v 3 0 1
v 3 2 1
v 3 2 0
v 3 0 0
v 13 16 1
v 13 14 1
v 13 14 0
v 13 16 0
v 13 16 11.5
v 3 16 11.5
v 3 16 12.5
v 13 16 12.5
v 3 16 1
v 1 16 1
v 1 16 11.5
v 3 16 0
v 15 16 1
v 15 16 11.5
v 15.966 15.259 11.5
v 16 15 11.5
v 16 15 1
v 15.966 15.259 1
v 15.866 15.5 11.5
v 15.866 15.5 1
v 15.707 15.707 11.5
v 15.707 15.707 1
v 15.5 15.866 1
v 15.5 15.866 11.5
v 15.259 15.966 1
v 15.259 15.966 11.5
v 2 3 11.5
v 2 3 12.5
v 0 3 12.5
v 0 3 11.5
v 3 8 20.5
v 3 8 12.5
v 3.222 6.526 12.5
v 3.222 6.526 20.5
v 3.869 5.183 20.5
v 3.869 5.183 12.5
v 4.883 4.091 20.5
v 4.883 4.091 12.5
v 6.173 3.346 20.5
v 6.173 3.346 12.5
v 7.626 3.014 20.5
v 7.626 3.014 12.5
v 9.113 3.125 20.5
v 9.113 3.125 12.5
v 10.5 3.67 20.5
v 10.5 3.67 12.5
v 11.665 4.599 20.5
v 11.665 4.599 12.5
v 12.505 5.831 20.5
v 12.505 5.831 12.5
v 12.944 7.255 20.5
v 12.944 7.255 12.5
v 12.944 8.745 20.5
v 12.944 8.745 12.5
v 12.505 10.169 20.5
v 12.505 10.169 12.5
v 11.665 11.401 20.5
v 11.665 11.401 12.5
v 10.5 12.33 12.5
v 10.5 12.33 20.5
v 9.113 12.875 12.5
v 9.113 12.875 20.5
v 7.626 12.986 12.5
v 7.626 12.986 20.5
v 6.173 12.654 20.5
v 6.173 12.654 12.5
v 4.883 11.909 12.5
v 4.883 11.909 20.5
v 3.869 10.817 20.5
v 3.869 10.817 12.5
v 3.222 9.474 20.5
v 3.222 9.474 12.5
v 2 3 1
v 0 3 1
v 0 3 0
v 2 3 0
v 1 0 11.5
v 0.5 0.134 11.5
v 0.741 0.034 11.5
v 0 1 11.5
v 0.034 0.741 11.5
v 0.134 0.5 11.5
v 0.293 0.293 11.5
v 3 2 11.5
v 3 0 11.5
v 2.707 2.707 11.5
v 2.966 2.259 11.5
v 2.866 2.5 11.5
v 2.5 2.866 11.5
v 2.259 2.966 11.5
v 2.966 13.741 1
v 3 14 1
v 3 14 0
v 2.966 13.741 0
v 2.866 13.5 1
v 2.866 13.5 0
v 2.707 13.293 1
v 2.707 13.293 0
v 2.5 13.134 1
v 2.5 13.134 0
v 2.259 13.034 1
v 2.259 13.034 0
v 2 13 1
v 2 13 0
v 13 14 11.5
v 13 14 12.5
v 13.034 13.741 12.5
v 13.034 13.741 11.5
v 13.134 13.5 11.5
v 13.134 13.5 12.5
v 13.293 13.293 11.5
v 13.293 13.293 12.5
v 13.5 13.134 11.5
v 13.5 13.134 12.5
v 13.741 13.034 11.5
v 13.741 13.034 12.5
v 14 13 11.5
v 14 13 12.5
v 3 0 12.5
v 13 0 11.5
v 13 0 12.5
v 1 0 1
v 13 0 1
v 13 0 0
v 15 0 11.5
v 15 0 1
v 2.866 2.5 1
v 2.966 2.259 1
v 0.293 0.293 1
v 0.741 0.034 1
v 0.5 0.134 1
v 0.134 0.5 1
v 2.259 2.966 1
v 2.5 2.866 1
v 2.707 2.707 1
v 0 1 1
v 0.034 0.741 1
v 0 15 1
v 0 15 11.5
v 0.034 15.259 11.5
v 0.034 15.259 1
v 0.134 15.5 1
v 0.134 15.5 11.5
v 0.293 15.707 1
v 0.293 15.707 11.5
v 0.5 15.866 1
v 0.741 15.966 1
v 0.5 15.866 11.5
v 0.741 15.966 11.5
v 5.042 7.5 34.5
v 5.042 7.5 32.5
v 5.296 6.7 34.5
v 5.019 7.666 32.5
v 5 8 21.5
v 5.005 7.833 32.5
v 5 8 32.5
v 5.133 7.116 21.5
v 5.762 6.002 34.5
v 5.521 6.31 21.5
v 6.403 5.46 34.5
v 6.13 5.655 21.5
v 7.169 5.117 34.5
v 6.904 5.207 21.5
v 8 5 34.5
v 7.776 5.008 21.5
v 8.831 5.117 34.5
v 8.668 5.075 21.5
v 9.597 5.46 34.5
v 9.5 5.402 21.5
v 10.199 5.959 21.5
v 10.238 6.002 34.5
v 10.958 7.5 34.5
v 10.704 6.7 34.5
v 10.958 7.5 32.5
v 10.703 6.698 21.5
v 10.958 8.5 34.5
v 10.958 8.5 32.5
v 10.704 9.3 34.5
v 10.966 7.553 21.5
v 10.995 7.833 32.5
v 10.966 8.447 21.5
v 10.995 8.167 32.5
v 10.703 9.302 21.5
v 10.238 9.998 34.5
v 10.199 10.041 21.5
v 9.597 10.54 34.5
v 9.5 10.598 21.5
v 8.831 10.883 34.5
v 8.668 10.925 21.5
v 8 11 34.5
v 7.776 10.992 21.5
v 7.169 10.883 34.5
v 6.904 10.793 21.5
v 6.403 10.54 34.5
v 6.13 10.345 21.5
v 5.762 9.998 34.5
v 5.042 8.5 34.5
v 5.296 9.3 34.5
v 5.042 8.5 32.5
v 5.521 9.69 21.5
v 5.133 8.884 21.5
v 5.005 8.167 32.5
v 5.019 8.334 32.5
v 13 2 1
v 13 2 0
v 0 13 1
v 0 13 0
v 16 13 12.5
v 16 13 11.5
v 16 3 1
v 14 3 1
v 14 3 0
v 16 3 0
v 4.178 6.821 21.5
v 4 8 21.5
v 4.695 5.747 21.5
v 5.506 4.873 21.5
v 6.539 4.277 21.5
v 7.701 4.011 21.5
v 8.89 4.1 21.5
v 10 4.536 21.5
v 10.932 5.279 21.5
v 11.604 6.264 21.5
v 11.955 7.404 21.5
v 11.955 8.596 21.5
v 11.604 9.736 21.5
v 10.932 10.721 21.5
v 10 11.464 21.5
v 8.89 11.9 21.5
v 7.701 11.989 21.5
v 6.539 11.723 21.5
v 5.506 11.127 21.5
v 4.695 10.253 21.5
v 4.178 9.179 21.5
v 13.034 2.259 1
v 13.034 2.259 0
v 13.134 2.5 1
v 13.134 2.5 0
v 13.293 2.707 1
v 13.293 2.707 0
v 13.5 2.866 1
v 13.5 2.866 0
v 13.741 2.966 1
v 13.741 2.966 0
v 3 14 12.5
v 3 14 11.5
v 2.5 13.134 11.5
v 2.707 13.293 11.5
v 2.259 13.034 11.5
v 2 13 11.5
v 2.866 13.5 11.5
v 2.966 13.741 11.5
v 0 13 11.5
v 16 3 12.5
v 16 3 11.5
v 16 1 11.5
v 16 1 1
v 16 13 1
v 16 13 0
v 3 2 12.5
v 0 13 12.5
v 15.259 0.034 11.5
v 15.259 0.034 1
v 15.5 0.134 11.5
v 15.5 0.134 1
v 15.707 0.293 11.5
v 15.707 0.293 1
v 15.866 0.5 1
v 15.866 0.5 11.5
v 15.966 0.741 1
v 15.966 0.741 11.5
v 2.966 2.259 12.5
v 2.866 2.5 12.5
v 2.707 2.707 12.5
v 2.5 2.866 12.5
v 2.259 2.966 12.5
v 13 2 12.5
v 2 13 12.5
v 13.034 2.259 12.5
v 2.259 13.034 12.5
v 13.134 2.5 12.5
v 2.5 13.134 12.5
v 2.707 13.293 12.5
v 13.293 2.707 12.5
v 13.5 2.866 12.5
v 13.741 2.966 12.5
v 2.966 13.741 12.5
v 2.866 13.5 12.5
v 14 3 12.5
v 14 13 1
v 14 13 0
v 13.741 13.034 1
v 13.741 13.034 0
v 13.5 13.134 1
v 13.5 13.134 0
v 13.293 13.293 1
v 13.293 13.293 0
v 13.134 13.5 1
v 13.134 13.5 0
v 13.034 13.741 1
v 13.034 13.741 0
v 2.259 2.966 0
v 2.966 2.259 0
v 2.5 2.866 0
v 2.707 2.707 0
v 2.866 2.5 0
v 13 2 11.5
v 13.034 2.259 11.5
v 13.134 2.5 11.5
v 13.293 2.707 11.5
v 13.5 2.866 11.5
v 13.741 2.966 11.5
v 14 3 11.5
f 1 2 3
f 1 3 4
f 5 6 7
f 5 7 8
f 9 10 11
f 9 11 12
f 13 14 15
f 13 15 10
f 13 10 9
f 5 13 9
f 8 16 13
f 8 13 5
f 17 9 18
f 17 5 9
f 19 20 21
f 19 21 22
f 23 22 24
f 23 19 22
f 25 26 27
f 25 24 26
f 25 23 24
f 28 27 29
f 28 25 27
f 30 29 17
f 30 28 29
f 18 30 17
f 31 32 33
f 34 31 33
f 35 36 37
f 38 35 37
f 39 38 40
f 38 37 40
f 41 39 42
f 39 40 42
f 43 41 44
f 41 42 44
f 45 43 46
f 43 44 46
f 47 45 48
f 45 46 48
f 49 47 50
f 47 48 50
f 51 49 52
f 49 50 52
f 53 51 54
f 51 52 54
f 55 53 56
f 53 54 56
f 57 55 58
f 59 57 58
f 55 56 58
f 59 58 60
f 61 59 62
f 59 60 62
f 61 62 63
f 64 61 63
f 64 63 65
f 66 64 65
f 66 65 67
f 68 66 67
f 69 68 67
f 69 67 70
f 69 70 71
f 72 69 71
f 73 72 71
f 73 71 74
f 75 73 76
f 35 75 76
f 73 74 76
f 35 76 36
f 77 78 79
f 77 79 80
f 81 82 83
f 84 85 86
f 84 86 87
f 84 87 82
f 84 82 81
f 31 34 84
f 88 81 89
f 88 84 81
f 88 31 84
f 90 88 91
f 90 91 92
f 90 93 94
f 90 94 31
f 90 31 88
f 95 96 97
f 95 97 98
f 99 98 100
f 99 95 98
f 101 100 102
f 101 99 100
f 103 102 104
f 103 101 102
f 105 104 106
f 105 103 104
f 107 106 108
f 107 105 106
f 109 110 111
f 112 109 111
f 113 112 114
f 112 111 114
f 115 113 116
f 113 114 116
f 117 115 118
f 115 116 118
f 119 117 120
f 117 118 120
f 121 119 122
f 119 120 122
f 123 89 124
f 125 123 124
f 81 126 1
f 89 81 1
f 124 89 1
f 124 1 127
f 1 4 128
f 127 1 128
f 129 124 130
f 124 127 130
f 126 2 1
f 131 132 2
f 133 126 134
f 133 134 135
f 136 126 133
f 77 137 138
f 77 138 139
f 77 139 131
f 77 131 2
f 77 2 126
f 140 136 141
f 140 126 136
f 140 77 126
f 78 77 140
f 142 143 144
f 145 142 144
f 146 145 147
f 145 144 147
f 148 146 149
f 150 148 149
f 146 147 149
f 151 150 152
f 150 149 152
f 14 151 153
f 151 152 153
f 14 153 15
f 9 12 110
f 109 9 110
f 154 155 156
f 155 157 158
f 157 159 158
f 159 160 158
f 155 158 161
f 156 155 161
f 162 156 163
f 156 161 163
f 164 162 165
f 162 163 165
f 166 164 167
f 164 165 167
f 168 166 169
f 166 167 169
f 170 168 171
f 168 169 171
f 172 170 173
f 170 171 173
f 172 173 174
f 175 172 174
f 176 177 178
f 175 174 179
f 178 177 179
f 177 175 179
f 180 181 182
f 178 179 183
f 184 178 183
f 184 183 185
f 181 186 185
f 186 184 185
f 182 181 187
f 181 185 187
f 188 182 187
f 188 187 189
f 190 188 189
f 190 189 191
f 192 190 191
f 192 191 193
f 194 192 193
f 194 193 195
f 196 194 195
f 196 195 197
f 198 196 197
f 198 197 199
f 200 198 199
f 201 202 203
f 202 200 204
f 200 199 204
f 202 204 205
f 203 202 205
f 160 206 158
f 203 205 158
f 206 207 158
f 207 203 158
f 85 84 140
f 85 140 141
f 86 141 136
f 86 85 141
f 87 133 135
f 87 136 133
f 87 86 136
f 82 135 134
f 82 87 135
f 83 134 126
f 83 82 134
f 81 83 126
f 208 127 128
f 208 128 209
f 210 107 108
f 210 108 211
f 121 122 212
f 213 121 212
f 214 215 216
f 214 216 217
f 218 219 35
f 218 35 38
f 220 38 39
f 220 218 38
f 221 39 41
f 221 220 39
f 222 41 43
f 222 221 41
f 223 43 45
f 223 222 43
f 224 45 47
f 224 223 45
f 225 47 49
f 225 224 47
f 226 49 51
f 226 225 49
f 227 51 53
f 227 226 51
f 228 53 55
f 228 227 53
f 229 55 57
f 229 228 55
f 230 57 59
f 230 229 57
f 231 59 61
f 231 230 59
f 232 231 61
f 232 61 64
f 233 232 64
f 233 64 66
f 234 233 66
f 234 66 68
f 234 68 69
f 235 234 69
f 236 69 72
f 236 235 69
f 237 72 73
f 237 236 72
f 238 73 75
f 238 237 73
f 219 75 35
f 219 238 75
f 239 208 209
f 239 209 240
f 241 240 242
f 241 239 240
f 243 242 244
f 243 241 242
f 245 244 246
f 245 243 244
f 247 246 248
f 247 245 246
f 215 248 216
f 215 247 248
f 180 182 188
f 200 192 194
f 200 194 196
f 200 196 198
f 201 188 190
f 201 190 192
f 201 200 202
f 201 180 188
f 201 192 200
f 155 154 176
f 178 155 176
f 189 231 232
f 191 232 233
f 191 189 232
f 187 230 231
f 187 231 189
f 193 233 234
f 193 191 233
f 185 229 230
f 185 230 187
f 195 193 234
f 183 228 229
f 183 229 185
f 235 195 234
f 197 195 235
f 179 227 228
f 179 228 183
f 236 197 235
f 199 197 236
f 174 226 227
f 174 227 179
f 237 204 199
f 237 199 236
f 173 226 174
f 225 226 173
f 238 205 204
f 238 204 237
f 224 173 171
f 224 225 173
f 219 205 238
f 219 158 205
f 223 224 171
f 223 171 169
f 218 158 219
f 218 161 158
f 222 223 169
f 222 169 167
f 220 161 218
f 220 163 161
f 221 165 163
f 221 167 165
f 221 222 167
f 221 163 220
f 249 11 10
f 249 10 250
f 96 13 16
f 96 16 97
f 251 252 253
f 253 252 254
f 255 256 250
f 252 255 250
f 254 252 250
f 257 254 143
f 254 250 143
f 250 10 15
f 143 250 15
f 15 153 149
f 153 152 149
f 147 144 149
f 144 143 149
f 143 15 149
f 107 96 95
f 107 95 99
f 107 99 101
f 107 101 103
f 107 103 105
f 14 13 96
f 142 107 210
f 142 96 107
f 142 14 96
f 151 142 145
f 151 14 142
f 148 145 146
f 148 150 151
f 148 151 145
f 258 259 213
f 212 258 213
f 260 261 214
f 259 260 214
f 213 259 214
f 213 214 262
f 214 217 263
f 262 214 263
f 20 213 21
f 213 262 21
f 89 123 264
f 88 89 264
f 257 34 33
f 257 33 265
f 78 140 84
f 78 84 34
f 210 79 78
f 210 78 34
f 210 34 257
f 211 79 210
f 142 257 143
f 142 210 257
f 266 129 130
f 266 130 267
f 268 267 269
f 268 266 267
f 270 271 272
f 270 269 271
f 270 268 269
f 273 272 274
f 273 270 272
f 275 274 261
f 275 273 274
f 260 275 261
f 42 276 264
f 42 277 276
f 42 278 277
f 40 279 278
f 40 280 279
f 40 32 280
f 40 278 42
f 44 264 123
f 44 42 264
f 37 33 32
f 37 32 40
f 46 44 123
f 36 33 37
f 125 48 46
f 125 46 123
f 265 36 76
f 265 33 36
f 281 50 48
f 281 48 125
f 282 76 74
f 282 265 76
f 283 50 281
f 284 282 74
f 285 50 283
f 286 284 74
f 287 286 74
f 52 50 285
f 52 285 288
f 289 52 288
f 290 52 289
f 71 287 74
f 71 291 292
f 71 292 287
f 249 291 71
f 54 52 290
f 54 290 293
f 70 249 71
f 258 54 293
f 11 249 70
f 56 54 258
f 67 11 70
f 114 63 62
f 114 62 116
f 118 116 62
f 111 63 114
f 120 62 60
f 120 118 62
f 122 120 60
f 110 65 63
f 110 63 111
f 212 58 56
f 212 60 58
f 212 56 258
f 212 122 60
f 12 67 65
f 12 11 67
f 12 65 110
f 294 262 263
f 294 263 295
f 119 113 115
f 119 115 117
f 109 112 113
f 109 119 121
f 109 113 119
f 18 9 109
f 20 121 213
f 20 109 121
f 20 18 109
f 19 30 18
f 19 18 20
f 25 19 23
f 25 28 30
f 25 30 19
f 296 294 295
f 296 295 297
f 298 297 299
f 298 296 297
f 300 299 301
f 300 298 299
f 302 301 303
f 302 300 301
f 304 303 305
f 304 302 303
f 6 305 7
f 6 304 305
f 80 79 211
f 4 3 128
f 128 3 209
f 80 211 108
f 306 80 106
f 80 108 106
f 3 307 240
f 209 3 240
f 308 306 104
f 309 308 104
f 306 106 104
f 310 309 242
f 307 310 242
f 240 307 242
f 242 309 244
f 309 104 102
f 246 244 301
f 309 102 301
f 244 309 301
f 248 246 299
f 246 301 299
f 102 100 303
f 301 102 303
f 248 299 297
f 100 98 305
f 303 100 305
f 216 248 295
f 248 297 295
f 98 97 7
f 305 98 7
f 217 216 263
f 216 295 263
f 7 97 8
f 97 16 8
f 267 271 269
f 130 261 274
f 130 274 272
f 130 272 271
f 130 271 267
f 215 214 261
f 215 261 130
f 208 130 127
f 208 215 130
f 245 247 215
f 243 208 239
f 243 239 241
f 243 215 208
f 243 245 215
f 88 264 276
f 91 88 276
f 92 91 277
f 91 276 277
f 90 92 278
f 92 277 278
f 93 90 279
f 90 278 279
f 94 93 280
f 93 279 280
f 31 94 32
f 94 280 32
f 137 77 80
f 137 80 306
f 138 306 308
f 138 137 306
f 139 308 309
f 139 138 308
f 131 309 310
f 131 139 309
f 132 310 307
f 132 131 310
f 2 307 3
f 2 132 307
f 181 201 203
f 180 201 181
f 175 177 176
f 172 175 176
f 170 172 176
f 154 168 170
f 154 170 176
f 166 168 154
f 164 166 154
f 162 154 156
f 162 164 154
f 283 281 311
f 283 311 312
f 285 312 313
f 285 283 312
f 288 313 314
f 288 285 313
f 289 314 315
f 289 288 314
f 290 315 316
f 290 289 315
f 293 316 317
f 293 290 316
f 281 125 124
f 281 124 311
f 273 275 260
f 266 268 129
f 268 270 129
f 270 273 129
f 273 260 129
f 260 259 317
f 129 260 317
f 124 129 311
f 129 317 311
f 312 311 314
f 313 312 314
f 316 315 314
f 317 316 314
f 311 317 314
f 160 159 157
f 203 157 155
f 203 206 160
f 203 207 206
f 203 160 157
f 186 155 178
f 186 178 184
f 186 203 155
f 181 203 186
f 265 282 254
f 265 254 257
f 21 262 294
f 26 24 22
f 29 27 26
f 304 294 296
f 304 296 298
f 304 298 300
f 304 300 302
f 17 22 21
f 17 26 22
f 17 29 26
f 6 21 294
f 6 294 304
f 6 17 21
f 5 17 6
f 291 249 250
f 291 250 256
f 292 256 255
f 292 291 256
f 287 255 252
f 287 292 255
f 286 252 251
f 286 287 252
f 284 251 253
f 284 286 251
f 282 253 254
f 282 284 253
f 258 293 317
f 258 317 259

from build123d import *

# Parameters (mm, degrees)
ESQUISSE1_W             = 16
ESQUISSE1_H             = 16
EXTRUSION1_DEPTH        = 12.5
CONG_1_R                = 1
ESQUISSE2_R             = 5
EXTRUSION2_DEPTH        = 9
CHANFREIN1_SIZE         = 1
ESQUISSE3_R             = 3
EXTRUSION3_DEPTH        = 13
ESQUISSE4_W             = 6.995230525
ESQUISSE4_H             = 1
ENL_V_MAT_EXTRU_1_DEPTH = 2
ENL_V_MAT_EXTRU_2_DEPTH = 1
ENL_V_START             = -1
ENL_V_MAT_EXTRU_3_DEPTH = 1


with BuildPart() as part:
    # Esquisse1 → Extrusion1 (new body)
    with BuildSketch(Plane.XY):
        with Locations((8, 8)):
            Rectangle(ESQUISSE1_W, ESQUISSE1_H)
    extrude(amount=EXTRUSION1_DEPTH)

    # Congé1
    cong_1_edges = [part.edges().sort_by_distance(p)[0] for p in [
        (0, 16, 6.25),
        (16, 16, 6.25),
        (16, 0, 6.25),
        (0, 0, 6.25),
    ]]
    fillet(cong_1_edges, radius=CONG_1_R)

    # Esquisse2 → Extrusion2 (add)
    with BuildSketch(Plane.XY.offset(12.5)):
        with Locations(Location((8, 8, 0), (0, 0, 180))):
            Circle(ESQUISSE2_R)
    extrude(amount=EXTRUSION2_DEPTH)

    # Chanfrein1
    chanfrein1_edges = [part.edges().sort_by_distance(p)[0] for p in [
        (13, 8, 21.5),
    ]]
    chamfer(chanfrein1_edges, length=CHANFREIN1_SIZE)

    # Esquisse3 → Extrusion3 (add)
    with BuildSketch(Plane.XY.offset(21.5)):
        with Locations(Location((8, 8, 0), (0, 0, 180))):
            Circle(ESQUISSE3_R)
    extrude(amount=EXTRUSION3_DEPTH)

    # Esquisse4 → Enlèv. mat.-Extru.1 (cut)
    with BuildSketch(Plane.XY.offset(34.5)):
        with Locations((8.099931865, 8)):
            Rectangle(ESQUISSE4_W, ESQUISSE4_H)
    extrude(amount=-ENL_V_MAT_EXTRU_1_DEPTH, mode=Mode.SUBTRACT)

    # Esquisse5 → Enlèv. mat.-Extru.2 (cut)
    with BuildSketch(Plane.XY.offset(12.5)):
        with BuildLine():
            Line((13, 17.678512004), (13, 14))
            ThreePointArc((13, 14), (13.292893219, 13.292893219), (14, 13))
            Line((14, 13), (16.806932946, 13))
            Line((16.806932946, 13), (16.806932946, 17.678512004))
            Line((16.806932946, 17.678512004), (13, 17.678512004))
        make_face()
        with BuildLine():
            Line((-0.806932946, 17.678512004), (3, 17.678512004))
            Line((3, 17.678512004), (3, 14))
            ThreePointArc((3, 14), (2.707106781, 13.292893219), (2, 13))
            Line((2, 13), (-0.806932946, 13))
            Line((-0.806932946, 13), (-0.806932946, 17.678512004))
        make_face()
        with BuildLine():
            Line((16.806932946, -1.678512004), (13, -1.678512004))
            Line((13, -1.678512004), (13, 2))
            ThreePointArc((13, 2), (13.292893219, 2.707106781), (14, 3))
            Line((14, 3), (16.806932946, 3))
            Line((16.806932946, 3), (16.806932946, -1.678512004))
        make_face()
        with BuildLine():
            Line((3, -1.678512004), (3, 2))
            ThreePointArc((3, 2), (2.707106781, 2.707106781), (2, 3))
            Line((2, 3), (-0.806932946, 3))
            Line((-0.806932946, 3), (-0.806932946, -1.678512004))
            Line((-0.806932946, -1.678512004), (3, -1.678512004))
        make_face()
    extrude(amount=-ENL_V_MAT_EXTRU_2_DEPTH, mode=Mode.SUBTRACT)

    # Esquisse6 → Enlèv. mat.-Extru.3 (cut)
    with BuildSketch(Plane(origin=(0, 0, 0), x_dir=(-1, 0, 0), z_dir=(0, 0, -1)).offset(ENL_V_START)):
        with BuildLine():
            Line((0, 13), (0, 15))
            ThreePointArc((0, 15), (-0.292893219, 15.707106781), (-1, 16))
            Line((-1, 16), (-3, 16))
            Line((-3, 16), (-3, 14))
            ThreePointArc((-3, 14), (-2.707106781, 13.292893219), (-2, 13))
            Line((-2, 13), (0, 13))
        make_face()
        with BuildLine():
            Line((-13, 16), (-15, 16))
            ThreePointArc((-15, 16), (-15.707106781, 15.707106781), (-16, 15))
            Line((-16, 15), (-16, 13))
            Line((-16, 13), (-14, 13))
            ThreePointArc((-14, 13), (-13.292893219, 13.292893219), (-13, 14))
            Line((-13, 14), (-13, 16))
        make_face()
        with BuildLine():
            Line((-3, 0), (-1, 0))
            ThreePointArc((-1, 0), (-0.292893219, 0.292893219), (0, 1))
            Line((0, 1), (0, 3))
            Line((0, 3), (-2, 3))
            ThreePointArc((-2, 3), (-2.707106781, 2.707106781), (-3, 2))
            Line((-3, 2), (-3, 0))
        make_face()
        with BuildLine():
            Line((-15, 0), (-13, 0))
            Line((-13, 0), (-13, 2))
            ThreePointArc((-13, 2), (-13.292893219, 2.707106781), (-14, 3))
            Line((-14, 3), (-16, 3))
            Line((-16, 3), (-16, 1))
            ThreePointArc((-16, 1), (-15.707106781, 0.292893219), (-15, 0))
        make_face()
    extrude(amount=ENL_V_MAT_EXTRU_3_DEPTH, mode=Mode.SUBTRACT)


solid = part.part
